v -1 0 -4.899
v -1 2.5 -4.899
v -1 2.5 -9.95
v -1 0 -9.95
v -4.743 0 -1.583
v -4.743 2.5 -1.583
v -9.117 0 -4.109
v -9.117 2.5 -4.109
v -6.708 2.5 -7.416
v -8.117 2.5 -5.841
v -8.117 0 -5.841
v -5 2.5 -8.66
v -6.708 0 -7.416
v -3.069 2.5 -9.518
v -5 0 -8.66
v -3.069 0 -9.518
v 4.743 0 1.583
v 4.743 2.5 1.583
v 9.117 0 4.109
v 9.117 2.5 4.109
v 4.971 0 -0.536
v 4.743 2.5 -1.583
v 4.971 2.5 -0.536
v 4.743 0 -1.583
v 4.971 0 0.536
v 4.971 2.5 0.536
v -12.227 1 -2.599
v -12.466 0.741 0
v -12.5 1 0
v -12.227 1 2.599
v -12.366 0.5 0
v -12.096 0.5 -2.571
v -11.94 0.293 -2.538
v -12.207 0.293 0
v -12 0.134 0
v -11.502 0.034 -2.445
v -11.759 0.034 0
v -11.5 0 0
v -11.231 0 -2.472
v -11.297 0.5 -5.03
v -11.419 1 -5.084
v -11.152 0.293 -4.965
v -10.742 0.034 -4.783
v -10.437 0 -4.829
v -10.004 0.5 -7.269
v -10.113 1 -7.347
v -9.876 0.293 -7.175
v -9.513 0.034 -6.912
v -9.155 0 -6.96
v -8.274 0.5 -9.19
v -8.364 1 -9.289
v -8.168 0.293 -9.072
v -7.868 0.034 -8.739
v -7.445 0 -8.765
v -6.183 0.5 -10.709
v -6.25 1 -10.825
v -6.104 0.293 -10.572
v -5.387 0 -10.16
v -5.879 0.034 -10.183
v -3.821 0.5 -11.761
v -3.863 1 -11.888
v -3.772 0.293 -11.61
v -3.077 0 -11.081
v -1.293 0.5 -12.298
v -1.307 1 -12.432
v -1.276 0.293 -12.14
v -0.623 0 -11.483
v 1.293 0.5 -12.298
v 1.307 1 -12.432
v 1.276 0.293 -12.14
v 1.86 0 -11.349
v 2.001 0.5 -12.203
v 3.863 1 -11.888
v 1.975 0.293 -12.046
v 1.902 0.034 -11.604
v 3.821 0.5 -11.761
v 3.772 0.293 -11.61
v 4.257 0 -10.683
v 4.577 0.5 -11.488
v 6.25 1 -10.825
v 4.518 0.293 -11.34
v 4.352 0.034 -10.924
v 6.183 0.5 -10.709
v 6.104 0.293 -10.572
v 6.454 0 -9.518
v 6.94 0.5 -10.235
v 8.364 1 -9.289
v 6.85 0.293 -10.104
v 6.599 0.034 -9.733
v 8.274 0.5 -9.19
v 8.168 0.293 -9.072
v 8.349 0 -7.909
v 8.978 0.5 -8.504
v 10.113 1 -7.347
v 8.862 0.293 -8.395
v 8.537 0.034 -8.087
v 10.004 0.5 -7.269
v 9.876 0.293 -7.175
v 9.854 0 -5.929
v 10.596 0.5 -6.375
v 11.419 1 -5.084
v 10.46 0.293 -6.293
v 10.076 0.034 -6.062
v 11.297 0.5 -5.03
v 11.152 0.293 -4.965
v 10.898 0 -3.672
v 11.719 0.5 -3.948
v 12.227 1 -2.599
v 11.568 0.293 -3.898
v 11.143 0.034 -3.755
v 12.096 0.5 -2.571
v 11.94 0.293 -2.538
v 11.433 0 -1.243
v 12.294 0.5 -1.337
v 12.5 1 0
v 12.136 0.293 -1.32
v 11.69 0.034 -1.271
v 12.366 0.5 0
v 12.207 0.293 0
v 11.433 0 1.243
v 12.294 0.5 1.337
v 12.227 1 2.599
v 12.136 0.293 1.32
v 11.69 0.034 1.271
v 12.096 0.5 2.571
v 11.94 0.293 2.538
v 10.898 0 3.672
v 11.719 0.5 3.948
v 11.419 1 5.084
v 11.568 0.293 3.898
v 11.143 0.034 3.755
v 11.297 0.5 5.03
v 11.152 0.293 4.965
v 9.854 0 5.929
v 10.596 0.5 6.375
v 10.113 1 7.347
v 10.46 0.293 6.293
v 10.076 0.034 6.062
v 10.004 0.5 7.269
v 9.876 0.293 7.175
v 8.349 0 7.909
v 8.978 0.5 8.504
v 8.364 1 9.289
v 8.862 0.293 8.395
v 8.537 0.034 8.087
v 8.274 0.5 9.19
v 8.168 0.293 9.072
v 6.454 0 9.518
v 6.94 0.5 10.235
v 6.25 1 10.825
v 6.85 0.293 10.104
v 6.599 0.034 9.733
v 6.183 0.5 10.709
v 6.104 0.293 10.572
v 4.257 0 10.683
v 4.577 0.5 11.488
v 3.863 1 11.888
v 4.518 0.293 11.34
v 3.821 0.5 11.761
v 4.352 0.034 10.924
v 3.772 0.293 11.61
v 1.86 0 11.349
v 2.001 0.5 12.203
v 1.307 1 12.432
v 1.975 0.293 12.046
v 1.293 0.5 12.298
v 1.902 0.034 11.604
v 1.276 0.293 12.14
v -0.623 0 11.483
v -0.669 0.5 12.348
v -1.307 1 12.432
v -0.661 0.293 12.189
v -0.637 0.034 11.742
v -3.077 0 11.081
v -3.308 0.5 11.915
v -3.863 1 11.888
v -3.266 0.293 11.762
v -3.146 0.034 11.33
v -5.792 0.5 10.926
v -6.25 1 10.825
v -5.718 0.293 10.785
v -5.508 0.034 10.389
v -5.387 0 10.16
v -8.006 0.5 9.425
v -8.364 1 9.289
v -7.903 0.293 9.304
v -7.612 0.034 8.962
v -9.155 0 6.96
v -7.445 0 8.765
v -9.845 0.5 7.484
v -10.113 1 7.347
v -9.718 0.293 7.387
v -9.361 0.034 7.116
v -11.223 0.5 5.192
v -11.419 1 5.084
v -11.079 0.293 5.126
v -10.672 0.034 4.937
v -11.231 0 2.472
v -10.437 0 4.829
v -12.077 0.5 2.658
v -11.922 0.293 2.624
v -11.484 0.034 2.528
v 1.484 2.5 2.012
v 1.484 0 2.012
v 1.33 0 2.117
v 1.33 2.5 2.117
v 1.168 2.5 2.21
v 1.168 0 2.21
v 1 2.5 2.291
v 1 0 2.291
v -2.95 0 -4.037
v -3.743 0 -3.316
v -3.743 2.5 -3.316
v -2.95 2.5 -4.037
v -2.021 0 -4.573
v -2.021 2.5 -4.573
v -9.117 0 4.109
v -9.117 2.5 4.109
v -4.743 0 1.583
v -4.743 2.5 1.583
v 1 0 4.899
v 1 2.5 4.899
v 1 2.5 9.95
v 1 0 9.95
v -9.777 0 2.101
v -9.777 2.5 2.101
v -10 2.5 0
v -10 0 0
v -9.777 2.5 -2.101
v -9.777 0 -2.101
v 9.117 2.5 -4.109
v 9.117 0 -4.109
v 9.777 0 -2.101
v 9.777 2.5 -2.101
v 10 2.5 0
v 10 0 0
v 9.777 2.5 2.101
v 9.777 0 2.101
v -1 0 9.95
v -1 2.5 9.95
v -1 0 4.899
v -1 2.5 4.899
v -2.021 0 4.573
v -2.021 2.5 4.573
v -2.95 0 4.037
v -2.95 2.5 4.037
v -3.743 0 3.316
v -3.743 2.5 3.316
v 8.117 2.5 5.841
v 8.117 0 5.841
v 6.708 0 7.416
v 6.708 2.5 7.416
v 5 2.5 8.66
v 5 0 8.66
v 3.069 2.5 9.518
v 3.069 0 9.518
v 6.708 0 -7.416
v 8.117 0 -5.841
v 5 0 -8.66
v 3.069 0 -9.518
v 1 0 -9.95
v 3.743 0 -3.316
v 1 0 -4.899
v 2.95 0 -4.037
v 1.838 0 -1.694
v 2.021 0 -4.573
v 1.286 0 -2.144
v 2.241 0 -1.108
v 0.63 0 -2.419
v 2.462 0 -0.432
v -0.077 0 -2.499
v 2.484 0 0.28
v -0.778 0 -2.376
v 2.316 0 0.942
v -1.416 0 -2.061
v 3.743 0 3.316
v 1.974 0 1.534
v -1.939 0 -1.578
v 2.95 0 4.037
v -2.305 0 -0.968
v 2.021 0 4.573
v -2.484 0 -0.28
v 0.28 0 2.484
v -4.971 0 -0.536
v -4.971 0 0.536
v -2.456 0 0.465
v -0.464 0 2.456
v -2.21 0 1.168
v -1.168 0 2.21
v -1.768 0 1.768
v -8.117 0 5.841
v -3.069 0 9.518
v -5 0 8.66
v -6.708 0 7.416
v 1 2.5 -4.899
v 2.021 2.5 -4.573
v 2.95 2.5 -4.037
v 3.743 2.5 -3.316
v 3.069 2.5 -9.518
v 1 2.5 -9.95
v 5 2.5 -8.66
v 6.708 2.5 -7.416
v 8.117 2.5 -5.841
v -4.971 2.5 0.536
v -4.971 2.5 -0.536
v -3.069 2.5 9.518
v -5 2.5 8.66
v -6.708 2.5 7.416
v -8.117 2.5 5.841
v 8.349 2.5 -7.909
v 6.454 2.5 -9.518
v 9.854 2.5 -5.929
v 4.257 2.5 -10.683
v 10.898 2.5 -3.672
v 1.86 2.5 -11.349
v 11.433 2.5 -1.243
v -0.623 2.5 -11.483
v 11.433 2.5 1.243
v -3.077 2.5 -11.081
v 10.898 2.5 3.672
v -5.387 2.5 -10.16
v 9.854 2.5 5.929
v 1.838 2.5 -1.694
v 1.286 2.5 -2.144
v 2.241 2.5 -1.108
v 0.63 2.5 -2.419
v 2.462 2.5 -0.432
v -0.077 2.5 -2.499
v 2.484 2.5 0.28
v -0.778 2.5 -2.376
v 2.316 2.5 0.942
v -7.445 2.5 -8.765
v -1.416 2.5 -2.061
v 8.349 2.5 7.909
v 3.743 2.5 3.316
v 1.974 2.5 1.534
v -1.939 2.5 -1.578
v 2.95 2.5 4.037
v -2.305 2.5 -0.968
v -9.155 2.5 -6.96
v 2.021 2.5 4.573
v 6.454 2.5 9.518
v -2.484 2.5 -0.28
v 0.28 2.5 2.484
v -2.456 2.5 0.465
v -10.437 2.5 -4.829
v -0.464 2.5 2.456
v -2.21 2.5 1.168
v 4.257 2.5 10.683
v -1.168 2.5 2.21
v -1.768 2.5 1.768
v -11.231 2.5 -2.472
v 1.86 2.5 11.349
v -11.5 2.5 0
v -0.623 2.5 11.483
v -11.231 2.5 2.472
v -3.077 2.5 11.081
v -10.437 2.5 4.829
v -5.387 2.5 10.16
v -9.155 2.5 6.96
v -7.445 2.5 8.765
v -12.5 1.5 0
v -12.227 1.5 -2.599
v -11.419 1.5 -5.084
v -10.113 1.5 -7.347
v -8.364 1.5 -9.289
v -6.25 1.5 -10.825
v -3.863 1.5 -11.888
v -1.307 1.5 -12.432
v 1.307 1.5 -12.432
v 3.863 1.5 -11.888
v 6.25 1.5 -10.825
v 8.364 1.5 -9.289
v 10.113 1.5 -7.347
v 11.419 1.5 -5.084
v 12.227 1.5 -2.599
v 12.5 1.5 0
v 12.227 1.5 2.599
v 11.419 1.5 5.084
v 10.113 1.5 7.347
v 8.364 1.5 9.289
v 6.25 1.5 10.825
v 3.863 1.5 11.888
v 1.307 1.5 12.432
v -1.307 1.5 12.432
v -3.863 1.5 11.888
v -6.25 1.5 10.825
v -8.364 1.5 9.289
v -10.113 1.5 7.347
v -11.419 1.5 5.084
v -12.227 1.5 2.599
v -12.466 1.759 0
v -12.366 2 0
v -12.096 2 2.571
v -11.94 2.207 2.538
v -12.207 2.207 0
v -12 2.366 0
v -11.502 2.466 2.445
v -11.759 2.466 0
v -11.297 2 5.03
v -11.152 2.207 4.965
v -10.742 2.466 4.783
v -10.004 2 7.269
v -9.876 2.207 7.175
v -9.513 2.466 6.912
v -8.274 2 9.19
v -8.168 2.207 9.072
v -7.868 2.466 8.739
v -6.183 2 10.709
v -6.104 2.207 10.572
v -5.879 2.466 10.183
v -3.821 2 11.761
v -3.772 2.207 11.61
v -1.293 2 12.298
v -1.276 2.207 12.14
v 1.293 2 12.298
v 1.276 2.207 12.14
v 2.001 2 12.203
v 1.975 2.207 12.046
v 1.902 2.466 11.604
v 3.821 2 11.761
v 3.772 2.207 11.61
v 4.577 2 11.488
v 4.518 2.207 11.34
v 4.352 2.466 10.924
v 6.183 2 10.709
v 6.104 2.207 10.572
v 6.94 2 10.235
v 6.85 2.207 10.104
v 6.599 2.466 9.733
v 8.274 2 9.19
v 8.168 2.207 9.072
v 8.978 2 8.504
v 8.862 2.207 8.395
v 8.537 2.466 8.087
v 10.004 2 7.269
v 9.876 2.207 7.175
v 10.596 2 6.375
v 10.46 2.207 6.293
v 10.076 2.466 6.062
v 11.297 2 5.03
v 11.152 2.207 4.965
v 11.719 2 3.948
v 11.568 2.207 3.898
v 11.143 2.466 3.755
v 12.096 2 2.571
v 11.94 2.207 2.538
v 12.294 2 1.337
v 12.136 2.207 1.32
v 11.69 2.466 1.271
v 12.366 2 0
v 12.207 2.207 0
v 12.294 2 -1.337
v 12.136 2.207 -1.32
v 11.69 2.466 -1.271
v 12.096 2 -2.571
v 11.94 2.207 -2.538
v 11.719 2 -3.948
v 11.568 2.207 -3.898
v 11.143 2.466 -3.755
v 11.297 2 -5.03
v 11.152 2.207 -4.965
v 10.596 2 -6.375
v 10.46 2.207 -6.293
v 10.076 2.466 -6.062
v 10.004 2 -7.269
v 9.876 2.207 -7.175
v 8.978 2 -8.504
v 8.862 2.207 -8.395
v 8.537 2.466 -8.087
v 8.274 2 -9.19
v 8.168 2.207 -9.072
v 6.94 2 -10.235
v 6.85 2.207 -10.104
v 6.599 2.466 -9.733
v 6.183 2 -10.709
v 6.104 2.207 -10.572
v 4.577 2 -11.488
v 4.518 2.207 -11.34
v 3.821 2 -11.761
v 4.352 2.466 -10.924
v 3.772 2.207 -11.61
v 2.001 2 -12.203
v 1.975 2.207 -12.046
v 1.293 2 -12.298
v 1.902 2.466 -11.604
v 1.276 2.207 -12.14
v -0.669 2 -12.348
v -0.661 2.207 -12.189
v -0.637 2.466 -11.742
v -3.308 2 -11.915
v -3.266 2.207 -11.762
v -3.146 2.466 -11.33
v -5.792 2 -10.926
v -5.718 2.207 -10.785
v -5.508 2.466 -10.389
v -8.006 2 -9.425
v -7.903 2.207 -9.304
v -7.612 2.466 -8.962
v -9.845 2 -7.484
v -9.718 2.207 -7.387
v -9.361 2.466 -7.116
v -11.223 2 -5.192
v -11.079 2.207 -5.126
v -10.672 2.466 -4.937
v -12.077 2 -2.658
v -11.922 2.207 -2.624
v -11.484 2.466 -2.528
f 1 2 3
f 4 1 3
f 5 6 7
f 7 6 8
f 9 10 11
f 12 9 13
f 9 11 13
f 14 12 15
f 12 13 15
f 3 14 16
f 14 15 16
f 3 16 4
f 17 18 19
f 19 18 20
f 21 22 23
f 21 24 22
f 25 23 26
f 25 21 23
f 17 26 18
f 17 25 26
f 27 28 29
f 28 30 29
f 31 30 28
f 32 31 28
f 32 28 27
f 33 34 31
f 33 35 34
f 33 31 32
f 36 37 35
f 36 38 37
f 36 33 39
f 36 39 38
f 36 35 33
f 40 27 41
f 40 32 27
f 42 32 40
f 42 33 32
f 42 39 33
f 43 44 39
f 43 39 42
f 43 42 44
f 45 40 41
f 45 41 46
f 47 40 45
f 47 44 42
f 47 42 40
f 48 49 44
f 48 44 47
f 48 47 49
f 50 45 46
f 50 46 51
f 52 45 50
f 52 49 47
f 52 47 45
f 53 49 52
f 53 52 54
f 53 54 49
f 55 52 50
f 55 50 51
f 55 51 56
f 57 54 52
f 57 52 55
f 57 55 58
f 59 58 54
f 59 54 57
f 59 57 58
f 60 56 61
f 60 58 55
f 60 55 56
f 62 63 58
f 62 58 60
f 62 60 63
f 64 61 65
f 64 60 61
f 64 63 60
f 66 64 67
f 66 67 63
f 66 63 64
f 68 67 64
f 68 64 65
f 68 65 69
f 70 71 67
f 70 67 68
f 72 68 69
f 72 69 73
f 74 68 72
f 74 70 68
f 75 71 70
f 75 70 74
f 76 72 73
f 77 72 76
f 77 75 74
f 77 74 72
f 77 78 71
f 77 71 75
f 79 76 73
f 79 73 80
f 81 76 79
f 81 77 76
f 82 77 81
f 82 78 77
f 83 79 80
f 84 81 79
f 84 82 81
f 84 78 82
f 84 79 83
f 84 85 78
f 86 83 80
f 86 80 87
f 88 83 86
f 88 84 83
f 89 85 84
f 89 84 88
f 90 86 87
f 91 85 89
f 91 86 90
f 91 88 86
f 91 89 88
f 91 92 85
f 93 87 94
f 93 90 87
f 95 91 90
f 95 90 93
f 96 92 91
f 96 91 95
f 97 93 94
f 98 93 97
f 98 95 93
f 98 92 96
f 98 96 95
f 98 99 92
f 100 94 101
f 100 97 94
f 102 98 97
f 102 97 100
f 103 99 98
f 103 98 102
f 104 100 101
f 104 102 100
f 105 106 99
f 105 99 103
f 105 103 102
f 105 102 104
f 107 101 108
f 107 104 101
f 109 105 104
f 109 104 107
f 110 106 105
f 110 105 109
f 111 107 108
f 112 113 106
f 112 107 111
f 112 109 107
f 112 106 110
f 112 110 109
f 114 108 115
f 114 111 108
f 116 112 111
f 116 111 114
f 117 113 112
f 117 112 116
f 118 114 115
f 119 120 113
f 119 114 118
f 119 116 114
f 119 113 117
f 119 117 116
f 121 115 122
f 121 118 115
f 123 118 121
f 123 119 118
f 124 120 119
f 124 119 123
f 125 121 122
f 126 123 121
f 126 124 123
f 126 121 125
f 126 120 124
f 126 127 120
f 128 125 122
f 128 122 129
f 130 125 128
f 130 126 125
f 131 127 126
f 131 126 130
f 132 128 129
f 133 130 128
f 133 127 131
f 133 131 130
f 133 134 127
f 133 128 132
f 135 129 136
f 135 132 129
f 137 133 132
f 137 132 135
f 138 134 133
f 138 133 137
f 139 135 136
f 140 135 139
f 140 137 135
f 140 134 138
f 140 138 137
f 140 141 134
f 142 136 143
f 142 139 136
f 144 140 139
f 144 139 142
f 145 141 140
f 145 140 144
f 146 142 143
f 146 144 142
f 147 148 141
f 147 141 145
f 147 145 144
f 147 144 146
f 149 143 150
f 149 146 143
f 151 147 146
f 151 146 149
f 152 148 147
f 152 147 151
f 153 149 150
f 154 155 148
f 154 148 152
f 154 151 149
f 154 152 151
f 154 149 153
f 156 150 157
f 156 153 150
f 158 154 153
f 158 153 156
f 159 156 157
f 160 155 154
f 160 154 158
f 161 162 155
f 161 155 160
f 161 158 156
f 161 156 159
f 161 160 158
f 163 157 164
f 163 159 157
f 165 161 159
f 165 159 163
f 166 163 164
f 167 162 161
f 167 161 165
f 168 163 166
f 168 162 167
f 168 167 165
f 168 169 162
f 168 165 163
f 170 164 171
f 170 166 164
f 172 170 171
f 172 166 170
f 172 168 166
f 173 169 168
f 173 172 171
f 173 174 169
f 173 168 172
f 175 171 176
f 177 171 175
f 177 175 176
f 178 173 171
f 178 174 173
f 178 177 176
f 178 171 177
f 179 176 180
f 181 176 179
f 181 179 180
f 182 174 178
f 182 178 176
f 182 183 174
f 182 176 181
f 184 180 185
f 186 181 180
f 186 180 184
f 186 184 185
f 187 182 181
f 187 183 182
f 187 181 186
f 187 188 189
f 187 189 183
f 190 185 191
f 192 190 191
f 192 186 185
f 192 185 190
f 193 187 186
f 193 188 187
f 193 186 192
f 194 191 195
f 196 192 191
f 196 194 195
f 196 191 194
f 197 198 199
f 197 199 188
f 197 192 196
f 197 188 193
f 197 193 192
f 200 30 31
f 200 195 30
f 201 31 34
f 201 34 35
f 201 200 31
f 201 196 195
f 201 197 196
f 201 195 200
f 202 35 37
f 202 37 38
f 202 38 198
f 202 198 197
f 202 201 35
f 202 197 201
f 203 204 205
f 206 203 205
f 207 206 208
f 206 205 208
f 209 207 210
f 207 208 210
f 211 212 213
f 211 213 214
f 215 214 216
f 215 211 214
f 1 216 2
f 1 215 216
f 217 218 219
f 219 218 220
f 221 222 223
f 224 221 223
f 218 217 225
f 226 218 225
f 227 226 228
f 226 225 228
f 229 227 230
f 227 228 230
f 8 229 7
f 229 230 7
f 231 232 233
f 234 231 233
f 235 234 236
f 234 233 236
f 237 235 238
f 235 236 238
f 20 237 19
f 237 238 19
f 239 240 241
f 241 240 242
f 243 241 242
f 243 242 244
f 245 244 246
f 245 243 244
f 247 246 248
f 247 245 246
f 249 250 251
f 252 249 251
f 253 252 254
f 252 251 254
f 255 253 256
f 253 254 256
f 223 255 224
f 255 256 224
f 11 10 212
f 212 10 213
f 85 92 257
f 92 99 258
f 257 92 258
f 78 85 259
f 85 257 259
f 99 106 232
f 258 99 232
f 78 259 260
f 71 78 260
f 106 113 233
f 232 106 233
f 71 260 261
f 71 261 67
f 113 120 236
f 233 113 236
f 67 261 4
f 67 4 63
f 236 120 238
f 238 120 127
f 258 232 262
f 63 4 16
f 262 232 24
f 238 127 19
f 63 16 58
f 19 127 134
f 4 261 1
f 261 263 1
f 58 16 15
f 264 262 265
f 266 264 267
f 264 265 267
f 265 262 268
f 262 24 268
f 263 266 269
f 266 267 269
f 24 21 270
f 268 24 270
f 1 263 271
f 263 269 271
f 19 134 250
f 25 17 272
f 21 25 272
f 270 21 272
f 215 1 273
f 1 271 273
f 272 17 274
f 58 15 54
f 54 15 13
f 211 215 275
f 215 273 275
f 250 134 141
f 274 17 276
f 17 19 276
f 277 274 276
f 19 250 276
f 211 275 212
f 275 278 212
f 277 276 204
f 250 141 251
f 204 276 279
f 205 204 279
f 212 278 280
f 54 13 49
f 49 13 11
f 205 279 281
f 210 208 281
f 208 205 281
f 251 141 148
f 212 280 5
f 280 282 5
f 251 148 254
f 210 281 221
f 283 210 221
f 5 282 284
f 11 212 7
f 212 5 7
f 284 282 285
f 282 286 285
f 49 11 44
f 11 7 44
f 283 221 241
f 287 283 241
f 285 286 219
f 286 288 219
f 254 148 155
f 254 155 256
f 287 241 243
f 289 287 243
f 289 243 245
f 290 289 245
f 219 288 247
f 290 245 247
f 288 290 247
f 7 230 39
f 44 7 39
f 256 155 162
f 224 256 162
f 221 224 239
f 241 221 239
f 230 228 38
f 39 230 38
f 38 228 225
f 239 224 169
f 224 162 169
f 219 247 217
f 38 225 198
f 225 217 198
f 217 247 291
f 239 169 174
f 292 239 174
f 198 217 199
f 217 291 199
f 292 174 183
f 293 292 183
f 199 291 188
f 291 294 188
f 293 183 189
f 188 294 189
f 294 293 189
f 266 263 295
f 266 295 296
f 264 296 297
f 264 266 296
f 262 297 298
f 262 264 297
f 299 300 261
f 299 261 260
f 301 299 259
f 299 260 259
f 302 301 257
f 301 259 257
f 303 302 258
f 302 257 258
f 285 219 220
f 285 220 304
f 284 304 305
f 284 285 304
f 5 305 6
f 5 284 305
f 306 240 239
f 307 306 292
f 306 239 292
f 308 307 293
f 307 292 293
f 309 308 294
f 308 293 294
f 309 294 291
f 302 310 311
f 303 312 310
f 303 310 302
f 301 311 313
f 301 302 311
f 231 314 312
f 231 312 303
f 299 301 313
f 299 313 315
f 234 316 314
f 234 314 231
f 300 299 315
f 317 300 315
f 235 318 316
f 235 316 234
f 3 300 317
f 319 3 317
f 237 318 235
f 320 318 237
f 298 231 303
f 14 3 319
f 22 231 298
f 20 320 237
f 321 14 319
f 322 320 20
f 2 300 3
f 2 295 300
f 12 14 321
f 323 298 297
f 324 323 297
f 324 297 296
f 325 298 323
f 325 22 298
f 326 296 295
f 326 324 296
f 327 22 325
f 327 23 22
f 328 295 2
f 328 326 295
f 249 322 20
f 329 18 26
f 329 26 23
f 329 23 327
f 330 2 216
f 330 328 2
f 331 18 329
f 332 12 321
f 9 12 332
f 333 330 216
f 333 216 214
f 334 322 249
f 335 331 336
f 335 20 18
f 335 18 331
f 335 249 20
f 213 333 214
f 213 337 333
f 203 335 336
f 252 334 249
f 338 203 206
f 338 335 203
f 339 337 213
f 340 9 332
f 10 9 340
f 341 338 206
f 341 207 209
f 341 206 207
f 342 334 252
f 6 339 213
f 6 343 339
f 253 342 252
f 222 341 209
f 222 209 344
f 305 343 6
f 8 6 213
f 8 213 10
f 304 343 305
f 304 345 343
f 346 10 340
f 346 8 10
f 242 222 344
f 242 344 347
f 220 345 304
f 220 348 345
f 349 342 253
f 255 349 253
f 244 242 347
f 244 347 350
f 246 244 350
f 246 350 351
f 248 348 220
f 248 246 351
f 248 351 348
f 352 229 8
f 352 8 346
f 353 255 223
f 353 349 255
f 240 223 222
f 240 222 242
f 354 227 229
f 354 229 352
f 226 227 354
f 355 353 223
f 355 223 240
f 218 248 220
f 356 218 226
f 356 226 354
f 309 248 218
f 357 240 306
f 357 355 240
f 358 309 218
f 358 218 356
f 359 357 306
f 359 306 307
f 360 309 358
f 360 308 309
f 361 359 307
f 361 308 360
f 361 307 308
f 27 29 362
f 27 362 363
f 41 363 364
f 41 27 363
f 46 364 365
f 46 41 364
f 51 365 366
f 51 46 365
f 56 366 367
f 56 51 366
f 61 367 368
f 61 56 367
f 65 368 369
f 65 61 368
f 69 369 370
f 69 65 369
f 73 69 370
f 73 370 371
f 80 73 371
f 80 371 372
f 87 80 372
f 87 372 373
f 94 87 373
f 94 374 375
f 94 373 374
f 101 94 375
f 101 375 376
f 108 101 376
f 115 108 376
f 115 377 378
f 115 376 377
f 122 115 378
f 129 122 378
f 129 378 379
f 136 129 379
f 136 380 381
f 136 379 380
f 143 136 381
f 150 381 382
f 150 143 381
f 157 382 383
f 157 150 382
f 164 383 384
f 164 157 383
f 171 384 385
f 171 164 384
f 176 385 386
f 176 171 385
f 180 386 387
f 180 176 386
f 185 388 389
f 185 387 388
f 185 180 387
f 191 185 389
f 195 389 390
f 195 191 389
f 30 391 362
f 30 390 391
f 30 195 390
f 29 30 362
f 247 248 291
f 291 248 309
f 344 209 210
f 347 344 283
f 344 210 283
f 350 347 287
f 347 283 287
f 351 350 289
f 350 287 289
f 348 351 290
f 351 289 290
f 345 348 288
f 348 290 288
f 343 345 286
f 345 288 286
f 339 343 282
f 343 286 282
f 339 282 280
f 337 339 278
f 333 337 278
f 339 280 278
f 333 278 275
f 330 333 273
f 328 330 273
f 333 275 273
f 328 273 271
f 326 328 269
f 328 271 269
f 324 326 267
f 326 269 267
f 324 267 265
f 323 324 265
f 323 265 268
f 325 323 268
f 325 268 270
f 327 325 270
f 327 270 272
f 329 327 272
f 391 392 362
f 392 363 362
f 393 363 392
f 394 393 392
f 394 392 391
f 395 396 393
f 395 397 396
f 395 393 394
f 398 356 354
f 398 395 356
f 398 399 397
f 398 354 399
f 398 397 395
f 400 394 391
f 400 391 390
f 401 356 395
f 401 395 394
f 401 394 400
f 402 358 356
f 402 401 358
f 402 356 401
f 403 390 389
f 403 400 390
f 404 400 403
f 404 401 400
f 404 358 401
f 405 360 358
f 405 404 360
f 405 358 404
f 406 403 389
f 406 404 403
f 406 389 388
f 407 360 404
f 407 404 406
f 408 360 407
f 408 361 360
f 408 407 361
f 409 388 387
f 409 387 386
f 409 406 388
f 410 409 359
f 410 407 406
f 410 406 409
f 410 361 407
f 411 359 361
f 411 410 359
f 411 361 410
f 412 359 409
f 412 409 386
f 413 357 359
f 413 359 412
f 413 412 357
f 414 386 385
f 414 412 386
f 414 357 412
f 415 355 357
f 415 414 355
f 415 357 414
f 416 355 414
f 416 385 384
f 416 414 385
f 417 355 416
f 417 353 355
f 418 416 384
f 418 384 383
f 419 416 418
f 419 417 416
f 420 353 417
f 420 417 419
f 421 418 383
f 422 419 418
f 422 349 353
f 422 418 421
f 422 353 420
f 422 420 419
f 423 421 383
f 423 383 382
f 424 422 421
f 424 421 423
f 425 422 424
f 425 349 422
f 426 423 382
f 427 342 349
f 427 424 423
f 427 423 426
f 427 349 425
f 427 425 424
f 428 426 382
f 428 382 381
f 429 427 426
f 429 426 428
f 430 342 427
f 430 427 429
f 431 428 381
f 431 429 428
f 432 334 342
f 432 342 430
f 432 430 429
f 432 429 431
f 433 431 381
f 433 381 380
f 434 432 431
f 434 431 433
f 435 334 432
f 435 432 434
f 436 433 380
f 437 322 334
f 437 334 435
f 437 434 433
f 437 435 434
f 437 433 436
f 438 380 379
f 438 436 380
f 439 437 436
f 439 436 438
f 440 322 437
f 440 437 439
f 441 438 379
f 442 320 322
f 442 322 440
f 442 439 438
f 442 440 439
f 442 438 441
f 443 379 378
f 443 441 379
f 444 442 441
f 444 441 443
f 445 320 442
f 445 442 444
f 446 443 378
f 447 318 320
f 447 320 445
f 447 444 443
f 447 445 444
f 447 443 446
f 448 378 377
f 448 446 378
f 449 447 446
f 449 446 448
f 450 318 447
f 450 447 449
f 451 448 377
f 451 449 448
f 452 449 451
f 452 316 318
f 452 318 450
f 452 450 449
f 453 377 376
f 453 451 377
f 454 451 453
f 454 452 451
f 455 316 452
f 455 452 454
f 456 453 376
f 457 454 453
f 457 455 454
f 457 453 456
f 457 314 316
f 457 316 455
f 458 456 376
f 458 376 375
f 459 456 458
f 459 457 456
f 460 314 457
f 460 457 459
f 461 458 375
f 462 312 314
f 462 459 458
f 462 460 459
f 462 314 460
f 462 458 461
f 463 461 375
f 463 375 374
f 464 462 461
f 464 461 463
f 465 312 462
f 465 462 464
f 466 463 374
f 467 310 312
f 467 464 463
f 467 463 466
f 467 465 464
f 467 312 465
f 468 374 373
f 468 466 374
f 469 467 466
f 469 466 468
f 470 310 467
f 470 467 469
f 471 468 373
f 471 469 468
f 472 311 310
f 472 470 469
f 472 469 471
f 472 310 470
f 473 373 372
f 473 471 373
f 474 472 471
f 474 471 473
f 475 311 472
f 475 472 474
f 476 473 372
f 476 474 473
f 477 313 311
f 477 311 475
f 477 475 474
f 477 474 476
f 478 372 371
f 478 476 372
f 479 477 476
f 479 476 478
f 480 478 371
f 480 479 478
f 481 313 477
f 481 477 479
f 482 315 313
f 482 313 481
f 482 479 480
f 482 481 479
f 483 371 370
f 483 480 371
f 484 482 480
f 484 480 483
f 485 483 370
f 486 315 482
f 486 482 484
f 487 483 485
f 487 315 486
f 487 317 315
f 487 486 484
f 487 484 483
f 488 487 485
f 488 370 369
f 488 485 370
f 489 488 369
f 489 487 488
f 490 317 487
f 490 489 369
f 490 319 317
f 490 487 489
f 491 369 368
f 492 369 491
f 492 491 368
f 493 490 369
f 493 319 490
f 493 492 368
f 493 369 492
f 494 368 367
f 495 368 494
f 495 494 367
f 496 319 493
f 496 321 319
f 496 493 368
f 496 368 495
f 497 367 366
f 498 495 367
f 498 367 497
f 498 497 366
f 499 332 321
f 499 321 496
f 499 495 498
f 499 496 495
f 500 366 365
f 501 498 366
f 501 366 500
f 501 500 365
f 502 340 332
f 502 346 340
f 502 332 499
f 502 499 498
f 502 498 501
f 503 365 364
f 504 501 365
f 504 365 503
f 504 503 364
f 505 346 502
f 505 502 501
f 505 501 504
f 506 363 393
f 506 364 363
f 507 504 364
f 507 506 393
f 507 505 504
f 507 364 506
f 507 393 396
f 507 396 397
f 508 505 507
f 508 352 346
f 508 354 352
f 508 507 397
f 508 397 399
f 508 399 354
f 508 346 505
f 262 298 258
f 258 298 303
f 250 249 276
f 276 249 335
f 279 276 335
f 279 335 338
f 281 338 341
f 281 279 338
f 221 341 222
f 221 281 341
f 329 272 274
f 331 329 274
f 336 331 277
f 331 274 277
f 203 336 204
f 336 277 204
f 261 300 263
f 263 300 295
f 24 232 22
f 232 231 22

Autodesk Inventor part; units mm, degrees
ref_plane "YZ Plane" through (0, 0, 0) normal (1, 0, 0) x (0, 1, 0)
ref_plane "XZ Plane" through (0, 0, 0) normal (0, 1, 0) x (-1, 0, 0)
ref_plane "XY Plane" through (0, 0, 0) normal (0, 0, 1) x (1, 0, 0)
sketch "스케치1" plane through (0, 0, 0) normal (0, 1, 0) x (-1, 0, 0)
  circle A0 centre (0, 0) radius 2.5
  circle A1 centre (0, 0) radius 12.5
  circle A2 centre (0, 0) radius 10
  circle A3 centre (0, 0) radius 5
  dimension "d0" = 5
  dimension "d1" = 25
  dimension "d2" = 20
  dimension "d3" = 10
extrude "돌출1" add sketch "스케치1" along normal blind 2.5
sketch "스케치2" plane through (0, 2.5, 0) normal (0, 1, 0) x (1, 0, 0)
  line L0 (1, -11) -> (-1, -11)
  line L1 (-1, -11) -> (-1, 11)
  line L2 (-1, 11) -> (1, 11)
  line L3 (1, 11) -> (1, -11)
  circle A0 centre (0, 0) radius 10 projected
  dimension "d6" = 1
  dimension "d7" = 1
  dimension "d8" = 1
  dimension "d9" = 1
extrude "돌출2" add sketch "스케치2" against normal blind 2.5 contours L0 L1 A0 L3 | A0 L1 L3 | A0 L1 L2 L3
pattern_circular "원형 패턴1" count 6 over 360 about axis through (0, 0, 0) along (0, 1, 0) of "돌출2"
sketch "스케치3" plane through (0, 2.5, 0) normal (0, 1, 0) x (1, 0, 0)
  line L0 (-2, 0) -> (-2.4843, 0.2796) projected
  circle A0 centre (0, 0) radius 2.5
extrude "돌출3" cut sketch "스케치3" against normal blind 2.5
fillet "모깎기1" radius 1 2 edges at (12.5, 2.5, 0) (12.5, 0, 0)
properties part number "보조바퀴"
